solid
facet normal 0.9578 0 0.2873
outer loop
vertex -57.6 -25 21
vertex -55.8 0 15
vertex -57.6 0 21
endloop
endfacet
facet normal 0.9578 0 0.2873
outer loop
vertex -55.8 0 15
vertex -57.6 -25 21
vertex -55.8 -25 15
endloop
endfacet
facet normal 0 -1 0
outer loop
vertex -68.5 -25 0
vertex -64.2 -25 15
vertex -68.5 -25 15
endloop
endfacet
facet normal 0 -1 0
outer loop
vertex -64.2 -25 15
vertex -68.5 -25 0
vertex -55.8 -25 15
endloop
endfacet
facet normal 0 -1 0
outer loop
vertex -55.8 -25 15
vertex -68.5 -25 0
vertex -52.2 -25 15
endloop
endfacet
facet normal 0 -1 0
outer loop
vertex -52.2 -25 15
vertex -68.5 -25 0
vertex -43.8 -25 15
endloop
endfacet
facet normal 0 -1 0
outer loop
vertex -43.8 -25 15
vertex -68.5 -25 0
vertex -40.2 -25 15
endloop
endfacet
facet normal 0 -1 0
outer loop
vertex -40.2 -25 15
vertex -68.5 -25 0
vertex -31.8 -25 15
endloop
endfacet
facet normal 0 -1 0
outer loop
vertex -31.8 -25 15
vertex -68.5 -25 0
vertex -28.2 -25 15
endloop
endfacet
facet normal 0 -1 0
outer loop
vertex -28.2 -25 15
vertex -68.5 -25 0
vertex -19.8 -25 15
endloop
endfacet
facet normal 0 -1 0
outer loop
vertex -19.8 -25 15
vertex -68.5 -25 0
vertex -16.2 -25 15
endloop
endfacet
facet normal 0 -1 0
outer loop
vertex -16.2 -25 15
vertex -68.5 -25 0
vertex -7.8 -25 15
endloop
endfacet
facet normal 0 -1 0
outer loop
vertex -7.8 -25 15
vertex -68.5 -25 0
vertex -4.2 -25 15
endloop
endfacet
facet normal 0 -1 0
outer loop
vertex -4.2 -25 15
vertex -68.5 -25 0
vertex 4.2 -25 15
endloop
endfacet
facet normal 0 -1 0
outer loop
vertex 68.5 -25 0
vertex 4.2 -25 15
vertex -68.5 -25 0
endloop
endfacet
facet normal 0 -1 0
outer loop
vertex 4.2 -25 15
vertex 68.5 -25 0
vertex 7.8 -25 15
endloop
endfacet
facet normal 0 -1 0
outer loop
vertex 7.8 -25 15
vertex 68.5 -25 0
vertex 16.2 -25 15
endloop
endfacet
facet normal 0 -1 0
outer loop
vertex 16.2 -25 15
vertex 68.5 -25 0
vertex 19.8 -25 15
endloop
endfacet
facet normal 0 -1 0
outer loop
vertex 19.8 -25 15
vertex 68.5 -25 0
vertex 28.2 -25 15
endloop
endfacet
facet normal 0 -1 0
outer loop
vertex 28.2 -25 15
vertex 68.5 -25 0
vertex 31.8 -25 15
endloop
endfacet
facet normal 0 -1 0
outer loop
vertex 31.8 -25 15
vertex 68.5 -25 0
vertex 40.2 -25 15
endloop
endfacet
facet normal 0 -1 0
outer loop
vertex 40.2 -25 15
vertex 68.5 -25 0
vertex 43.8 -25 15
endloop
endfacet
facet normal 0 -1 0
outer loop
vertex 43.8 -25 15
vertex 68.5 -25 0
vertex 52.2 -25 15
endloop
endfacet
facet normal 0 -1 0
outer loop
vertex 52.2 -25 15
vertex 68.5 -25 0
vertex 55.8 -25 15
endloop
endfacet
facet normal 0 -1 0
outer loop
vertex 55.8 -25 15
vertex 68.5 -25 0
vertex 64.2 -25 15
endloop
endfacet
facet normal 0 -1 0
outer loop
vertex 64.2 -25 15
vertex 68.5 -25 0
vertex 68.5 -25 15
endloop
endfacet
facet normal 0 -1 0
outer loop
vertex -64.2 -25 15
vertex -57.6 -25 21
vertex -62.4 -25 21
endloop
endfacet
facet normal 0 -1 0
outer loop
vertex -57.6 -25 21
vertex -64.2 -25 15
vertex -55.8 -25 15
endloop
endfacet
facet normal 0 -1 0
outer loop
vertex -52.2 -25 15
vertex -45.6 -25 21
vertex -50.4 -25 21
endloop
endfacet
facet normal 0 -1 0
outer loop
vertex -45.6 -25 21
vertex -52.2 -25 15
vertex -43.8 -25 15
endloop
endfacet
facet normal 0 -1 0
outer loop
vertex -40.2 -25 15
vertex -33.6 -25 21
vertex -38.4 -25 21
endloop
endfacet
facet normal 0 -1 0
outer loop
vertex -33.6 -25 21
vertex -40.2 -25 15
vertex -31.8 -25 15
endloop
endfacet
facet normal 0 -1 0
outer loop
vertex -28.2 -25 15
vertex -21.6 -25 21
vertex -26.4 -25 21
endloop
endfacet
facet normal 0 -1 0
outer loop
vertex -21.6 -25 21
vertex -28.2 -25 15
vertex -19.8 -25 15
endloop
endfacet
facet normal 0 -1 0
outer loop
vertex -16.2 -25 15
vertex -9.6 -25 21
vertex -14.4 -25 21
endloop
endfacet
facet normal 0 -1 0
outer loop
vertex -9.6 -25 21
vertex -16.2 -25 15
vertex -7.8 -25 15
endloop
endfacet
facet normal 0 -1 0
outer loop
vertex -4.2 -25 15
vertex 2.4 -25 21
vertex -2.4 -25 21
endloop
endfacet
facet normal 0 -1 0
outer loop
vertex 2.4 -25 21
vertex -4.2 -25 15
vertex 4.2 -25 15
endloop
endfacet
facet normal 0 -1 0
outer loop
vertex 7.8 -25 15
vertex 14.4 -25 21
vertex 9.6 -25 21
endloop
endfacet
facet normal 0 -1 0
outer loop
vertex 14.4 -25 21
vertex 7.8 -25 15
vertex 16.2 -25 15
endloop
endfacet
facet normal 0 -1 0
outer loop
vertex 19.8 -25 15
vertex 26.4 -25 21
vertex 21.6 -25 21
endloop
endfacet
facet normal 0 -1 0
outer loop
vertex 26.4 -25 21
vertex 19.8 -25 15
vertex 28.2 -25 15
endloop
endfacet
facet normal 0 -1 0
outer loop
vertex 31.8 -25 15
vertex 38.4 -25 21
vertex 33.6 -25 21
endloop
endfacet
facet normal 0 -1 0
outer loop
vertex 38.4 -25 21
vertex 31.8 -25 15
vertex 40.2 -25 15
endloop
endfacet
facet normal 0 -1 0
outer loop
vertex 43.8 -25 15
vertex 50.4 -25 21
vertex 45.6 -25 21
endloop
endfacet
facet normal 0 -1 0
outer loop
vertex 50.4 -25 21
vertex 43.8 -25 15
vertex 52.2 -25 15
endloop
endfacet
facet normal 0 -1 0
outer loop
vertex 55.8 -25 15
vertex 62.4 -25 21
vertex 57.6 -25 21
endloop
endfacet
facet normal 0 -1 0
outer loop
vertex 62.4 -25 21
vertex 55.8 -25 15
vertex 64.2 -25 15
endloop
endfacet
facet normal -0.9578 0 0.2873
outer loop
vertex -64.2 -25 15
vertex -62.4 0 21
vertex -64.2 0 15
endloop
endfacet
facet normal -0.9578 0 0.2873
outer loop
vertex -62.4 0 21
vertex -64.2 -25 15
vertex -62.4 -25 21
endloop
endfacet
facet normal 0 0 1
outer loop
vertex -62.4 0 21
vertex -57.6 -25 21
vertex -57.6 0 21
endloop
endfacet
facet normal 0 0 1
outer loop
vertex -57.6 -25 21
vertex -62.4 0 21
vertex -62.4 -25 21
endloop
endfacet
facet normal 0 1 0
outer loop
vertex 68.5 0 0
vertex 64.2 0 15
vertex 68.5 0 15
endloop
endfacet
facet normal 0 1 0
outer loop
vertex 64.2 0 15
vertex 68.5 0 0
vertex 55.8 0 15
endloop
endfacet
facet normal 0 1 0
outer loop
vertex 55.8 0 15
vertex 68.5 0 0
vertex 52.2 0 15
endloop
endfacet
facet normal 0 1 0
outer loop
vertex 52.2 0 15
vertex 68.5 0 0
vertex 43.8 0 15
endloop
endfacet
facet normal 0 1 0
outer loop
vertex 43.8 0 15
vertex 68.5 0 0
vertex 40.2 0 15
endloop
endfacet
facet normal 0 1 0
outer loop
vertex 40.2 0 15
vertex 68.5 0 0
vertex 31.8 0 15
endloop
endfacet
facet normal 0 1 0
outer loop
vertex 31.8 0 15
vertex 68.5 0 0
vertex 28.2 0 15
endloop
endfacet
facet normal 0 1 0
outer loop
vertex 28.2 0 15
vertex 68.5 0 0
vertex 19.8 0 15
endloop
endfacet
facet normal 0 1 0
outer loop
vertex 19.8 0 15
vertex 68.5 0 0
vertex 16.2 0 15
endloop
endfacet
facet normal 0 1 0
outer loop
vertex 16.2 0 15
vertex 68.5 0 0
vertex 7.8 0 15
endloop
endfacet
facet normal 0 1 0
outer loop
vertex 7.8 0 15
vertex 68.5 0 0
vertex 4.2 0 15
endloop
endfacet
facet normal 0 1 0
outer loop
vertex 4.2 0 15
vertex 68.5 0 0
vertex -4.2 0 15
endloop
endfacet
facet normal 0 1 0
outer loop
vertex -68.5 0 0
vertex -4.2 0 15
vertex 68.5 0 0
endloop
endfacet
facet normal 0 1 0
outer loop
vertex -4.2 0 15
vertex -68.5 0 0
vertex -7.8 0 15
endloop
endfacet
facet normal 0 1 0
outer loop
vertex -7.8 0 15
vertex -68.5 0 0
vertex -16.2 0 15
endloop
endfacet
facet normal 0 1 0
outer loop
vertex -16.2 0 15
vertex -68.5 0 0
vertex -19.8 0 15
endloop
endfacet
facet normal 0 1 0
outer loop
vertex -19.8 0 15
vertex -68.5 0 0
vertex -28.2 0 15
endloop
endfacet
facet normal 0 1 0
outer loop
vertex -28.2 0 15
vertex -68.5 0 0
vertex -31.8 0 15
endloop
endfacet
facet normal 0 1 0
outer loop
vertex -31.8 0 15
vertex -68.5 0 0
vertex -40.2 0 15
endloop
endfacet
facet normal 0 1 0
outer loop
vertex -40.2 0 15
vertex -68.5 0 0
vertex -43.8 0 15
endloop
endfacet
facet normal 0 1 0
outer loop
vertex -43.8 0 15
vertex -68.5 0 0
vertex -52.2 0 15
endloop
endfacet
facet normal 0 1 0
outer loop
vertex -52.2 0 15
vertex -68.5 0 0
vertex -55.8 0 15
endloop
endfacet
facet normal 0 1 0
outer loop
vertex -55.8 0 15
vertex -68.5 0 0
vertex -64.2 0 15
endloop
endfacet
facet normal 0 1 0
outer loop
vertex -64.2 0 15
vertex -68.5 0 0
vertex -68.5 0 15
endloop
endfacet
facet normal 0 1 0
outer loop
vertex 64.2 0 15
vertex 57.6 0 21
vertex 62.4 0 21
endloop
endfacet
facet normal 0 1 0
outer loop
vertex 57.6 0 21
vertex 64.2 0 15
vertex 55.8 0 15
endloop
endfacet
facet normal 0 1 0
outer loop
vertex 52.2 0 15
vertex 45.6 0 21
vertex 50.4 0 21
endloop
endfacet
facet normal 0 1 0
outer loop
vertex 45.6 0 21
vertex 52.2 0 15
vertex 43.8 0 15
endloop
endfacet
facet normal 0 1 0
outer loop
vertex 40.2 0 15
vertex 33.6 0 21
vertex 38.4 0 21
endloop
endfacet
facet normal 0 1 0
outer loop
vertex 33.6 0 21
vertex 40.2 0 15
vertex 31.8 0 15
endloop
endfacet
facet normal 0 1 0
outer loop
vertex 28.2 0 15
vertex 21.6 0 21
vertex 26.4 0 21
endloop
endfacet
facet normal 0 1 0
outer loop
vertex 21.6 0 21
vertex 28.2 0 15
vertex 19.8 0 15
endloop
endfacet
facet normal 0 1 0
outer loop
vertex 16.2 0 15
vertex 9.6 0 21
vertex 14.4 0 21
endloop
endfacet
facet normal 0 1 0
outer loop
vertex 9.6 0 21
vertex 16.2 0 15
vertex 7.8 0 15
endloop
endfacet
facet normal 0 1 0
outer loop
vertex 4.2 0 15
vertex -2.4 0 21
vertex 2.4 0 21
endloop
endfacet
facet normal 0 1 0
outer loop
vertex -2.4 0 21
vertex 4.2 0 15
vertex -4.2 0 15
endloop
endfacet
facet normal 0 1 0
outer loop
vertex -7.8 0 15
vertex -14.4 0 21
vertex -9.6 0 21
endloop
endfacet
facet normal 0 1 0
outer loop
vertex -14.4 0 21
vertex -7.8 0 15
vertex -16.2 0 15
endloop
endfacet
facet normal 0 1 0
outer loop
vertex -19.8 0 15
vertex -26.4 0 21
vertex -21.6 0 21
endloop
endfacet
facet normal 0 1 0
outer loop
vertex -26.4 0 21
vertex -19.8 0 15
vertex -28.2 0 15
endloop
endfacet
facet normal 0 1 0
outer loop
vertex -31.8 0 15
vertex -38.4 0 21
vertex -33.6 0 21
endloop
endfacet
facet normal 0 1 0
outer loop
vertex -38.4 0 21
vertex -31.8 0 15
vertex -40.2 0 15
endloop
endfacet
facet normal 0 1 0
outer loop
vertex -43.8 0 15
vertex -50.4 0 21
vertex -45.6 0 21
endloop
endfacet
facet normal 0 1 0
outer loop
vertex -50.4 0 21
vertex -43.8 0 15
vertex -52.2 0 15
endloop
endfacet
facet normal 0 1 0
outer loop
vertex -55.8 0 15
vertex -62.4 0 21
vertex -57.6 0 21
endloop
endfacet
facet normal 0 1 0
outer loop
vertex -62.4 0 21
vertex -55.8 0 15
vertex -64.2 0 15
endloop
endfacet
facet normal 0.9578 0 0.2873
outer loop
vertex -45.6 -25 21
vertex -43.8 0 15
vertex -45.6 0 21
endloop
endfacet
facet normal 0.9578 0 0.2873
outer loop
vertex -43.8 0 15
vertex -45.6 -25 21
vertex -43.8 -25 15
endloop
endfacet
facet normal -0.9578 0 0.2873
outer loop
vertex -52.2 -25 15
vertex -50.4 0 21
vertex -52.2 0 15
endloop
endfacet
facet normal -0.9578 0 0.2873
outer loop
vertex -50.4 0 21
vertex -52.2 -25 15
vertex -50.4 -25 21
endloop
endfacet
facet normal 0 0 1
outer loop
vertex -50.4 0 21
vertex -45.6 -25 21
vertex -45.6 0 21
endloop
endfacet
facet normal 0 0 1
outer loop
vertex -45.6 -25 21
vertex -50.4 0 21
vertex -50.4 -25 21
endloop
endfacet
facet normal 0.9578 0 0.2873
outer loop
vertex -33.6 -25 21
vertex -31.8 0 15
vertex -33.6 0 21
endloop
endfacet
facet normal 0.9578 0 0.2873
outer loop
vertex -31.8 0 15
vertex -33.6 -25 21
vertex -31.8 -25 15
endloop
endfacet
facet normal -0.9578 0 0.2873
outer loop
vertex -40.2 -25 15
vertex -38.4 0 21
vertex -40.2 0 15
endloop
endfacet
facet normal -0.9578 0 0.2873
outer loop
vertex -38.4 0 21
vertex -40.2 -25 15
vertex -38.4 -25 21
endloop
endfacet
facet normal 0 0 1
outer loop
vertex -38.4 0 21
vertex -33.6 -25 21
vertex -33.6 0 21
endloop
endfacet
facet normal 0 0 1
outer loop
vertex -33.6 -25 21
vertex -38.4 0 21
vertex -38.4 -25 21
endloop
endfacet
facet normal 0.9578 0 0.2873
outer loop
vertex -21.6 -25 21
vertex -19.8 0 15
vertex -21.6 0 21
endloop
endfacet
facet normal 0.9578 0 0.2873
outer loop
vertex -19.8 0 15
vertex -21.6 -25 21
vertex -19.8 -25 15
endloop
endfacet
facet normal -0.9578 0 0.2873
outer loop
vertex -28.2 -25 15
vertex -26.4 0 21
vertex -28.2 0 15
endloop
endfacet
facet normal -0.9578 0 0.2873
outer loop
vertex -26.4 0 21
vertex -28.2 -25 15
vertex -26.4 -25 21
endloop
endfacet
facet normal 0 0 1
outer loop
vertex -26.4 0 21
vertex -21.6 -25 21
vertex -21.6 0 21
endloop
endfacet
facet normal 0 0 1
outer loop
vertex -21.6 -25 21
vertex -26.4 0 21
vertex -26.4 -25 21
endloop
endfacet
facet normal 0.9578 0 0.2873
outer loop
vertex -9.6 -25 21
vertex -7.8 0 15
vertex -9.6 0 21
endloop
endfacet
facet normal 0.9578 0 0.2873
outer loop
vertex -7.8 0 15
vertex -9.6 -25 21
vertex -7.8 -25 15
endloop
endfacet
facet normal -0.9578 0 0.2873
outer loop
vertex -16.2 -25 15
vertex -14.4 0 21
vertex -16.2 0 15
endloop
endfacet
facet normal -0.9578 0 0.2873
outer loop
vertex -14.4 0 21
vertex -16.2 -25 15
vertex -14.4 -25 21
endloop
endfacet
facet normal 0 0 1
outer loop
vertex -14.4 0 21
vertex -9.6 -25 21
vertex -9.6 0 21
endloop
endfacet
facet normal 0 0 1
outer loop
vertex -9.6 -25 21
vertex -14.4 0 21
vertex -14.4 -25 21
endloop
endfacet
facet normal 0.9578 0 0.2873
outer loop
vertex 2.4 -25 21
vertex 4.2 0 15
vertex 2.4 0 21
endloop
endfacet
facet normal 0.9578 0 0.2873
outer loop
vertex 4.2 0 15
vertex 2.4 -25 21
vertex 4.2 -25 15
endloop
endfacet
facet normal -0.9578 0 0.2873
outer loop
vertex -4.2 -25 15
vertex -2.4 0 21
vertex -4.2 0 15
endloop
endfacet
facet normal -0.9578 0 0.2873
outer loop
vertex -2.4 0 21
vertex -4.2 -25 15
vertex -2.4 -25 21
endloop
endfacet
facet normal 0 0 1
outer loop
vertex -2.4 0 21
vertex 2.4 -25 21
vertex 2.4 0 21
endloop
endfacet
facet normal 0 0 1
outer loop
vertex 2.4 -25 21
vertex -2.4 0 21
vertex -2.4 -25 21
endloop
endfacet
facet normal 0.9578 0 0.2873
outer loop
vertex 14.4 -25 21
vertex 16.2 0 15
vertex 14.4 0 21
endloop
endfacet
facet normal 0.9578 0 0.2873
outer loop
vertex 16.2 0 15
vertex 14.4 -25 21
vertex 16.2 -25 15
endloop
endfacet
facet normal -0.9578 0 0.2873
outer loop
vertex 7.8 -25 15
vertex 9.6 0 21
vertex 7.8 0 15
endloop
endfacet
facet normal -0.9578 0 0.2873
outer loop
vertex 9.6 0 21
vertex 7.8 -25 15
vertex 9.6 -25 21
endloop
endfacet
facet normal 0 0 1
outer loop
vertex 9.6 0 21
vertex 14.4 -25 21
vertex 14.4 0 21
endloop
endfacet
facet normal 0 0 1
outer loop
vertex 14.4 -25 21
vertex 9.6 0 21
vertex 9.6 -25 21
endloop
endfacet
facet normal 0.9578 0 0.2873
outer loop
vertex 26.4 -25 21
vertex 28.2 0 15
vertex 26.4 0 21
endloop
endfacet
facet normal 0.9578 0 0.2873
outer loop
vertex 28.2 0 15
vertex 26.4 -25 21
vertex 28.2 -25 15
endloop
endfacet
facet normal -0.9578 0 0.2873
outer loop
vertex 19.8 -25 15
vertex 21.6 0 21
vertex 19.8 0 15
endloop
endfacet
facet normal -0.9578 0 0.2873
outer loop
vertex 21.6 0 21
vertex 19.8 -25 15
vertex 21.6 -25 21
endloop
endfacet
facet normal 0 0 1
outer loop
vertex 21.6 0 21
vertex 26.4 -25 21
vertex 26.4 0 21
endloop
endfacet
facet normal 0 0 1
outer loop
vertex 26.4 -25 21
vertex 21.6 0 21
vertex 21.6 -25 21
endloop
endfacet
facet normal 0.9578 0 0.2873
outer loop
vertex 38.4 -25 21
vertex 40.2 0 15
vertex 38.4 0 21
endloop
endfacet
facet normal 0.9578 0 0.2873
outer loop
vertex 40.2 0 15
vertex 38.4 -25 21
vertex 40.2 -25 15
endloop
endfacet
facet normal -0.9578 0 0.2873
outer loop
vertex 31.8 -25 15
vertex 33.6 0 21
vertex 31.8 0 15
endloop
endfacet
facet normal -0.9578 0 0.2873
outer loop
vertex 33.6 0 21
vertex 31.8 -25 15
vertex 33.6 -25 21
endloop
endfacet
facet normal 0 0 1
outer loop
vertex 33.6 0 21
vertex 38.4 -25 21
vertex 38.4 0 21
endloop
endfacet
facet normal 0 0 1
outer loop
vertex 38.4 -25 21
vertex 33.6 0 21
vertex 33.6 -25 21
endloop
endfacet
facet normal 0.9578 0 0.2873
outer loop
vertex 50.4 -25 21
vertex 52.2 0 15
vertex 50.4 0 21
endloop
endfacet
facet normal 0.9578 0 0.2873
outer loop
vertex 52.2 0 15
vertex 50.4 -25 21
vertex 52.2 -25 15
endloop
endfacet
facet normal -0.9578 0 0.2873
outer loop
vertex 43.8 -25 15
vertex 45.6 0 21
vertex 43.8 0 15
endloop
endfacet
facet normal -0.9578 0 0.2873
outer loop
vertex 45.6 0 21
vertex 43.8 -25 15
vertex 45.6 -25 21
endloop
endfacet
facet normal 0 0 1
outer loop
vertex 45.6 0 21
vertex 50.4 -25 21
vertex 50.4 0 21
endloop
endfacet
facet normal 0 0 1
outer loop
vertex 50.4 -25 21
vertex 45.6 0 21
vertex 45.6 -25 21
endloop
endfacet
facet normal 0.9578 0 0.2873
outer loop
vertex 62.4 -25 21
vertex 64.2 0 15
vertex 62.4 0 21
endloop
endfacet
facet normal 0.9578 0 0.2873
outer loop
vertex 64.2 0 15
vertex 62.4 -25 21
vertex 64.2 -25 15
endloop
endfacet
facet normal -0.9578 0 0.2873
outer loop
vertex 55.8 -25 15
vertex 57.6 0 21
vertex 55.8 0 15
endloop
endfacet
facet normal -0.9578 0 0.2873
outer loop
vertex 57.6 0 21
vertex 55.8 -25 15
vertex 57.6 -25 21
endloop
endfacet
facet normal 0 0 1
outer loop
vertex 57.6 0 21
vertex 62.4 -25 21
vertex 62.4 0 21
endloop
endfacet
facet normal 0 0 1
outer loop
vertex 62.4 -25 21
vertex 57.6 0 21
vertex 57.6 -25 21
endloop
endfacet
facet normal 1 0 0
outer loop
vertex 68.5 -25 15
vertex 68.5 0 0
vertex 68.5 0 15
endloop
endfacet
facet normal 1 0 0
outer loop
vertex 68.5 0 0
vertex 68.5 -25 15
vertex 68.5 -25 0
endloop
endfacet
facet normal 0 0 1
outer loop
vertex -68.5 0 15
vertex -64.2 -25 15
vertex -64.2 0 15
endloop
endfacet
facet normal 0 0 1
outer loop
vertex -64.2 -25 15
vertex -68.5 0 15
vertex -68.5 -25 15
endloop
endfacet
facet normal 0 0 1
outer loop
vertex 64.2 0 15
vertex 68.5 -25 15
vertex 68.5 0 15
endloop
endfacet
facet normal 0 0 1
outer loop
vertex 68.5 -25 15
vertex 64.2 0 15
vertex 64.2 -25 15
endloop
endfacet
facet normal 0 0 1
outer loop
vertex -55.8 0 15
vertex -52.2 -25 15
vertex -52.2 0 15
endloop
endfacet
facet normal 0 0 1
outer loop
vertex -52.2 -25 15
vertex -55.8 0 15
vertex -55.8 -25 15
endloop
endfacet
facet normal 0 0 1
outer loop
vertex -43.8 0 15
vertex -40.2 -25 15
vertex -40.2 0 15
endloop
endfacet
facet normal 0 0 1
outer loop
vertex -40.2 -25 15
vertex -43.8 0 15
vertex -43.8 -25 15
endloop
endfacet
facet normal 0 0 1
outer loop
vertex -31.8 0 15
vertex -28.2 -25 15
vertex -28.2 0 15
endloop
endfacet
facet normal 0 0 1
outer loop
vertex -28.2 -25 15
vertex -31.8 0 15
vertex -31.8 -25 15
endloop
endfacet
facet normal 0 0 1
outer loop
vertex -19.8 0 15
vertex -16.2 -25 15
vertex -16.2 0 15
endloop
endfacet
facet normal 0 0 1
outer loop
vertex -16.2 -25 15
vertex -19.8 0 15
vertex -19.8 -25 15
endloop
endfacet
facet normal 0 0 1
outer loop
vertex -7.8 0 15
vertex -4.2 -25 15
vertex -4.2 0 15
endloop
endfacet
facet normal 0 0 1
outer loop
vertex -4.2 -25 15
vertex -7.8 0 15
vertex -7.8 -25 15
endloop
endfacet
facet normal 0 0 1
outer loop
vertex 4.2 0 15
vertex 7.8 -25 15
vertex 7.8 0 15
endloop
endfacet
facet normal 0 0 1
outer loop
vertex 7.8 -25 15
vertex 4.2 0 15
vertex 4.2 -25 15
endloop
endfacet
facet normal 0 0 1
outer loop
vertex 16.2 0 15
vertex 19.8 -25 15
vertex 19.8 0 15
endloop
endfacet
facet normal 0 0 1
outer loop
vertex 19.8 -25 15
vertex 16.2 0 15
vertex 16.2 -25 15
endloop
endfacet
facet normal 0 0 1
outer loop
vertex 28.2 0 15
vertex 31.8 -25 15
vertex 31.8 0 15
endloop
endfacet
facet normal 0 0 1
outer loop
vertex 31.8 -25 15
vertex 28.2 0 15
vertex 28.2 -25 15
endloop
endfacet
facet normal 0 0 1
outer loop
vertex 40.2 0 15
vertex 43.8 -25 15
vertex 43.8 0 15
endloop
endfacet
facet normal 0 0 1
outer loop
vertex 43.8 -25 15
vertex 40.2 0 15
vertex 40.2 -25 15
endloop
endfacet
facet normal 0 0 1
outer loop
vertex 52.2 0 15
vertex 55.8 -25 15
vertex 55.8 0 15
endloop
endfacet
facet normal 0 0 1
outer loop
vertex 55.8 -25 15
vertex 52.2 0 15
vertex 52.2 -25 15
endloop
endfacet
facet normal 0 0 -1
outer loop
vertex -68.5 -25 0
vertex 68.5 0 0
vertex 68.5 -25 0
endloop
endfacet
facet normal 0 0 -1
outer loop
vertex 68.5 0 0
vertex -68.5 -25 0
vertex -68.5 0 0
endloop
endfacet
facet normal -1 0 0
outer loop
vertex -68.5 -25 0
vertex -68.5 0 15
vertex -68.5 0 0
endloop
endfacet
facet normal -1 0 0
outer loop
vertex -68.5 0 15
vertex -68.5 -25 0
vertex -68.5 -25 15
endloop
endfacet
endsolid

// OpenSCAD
$fn = 32;

// ----------------------------------------------------------------------
// Toothed rack, 11 teeth
// 12 mm pitch, 6 mm teeth
// ----------------------------------------------------------------------

// --- parameters (mm) ---
bar_w = 25;     // bar width (Y)
bar_h = 15;     // bar height (Z)
teeth = 11;     // number of teeth
pitch = 12;     // tooth pitch
tooth_h = 6;    // tooth height above the bar
root_w = 9;     // tooth width at the root
crest_w = 4.8;  // tooth width at the crest

// --- derived feature positions (mm) ---
span = (teeth - 1) * pitch;  // = 120   distance between the outer teeth
bar_l = span + root_w + 8;   // = 137   bar length: teeth plus 4 mm at each end
tooth_x = -span / 2;         // = -60   X of the first tooth
height = bar_h + tooth_h;    // = 21   overall height
feature_centers = [
  [tooth_x + 0 * pitch, -bar_w / 2],
  [tooth_x + 1 * pitch, -bar_w / 2],
  [tooth_x + 2 * pitch, -bar_w / 2],
  [tooth_x + 3 * pitch, -bar_w / 2],
  [tooth_x + 4 * pitch, -bar_w / 2],
  [tooth_x + 5 * pitch, -bar_w / 2],
  [tooth_x + 6 * pitch, -bar_w / 2],
  [tooth_x + 7 * pitch, -bar_w / 2],
  [tooth_x + 8 * pitch, -bar_w / 2],
  [tooth_x + 9 * pitch, -bar_w / 2],
  [tooth_x + 10 * pitch, -bar_w / 2]
];   // tooth centre line, drives the tooth loop

// bar with a rack of teeth, one extruded trapezoium per centre
module rack_tooth() {
  linear_extrude(height = bar_w)
    polygon(points = [
      [0, 0],
      [root_w, 0],
      [root_w / 2 + crest_w / 2, tooth_h + 1],
      [root_w / 2 - crest_w / 2, tooth_h + 1]
    ]);
}

union() {
  translate([-bar_l / 2, -bar_w, 0]) cube([bar_l, bar_w, bar_h]);
  for (centre = feature_centers)
    translate([centre[0] - root_w / 2, 0, bar_h - 1]) rotate([90, 0, 0]) rack_tooth();
}
